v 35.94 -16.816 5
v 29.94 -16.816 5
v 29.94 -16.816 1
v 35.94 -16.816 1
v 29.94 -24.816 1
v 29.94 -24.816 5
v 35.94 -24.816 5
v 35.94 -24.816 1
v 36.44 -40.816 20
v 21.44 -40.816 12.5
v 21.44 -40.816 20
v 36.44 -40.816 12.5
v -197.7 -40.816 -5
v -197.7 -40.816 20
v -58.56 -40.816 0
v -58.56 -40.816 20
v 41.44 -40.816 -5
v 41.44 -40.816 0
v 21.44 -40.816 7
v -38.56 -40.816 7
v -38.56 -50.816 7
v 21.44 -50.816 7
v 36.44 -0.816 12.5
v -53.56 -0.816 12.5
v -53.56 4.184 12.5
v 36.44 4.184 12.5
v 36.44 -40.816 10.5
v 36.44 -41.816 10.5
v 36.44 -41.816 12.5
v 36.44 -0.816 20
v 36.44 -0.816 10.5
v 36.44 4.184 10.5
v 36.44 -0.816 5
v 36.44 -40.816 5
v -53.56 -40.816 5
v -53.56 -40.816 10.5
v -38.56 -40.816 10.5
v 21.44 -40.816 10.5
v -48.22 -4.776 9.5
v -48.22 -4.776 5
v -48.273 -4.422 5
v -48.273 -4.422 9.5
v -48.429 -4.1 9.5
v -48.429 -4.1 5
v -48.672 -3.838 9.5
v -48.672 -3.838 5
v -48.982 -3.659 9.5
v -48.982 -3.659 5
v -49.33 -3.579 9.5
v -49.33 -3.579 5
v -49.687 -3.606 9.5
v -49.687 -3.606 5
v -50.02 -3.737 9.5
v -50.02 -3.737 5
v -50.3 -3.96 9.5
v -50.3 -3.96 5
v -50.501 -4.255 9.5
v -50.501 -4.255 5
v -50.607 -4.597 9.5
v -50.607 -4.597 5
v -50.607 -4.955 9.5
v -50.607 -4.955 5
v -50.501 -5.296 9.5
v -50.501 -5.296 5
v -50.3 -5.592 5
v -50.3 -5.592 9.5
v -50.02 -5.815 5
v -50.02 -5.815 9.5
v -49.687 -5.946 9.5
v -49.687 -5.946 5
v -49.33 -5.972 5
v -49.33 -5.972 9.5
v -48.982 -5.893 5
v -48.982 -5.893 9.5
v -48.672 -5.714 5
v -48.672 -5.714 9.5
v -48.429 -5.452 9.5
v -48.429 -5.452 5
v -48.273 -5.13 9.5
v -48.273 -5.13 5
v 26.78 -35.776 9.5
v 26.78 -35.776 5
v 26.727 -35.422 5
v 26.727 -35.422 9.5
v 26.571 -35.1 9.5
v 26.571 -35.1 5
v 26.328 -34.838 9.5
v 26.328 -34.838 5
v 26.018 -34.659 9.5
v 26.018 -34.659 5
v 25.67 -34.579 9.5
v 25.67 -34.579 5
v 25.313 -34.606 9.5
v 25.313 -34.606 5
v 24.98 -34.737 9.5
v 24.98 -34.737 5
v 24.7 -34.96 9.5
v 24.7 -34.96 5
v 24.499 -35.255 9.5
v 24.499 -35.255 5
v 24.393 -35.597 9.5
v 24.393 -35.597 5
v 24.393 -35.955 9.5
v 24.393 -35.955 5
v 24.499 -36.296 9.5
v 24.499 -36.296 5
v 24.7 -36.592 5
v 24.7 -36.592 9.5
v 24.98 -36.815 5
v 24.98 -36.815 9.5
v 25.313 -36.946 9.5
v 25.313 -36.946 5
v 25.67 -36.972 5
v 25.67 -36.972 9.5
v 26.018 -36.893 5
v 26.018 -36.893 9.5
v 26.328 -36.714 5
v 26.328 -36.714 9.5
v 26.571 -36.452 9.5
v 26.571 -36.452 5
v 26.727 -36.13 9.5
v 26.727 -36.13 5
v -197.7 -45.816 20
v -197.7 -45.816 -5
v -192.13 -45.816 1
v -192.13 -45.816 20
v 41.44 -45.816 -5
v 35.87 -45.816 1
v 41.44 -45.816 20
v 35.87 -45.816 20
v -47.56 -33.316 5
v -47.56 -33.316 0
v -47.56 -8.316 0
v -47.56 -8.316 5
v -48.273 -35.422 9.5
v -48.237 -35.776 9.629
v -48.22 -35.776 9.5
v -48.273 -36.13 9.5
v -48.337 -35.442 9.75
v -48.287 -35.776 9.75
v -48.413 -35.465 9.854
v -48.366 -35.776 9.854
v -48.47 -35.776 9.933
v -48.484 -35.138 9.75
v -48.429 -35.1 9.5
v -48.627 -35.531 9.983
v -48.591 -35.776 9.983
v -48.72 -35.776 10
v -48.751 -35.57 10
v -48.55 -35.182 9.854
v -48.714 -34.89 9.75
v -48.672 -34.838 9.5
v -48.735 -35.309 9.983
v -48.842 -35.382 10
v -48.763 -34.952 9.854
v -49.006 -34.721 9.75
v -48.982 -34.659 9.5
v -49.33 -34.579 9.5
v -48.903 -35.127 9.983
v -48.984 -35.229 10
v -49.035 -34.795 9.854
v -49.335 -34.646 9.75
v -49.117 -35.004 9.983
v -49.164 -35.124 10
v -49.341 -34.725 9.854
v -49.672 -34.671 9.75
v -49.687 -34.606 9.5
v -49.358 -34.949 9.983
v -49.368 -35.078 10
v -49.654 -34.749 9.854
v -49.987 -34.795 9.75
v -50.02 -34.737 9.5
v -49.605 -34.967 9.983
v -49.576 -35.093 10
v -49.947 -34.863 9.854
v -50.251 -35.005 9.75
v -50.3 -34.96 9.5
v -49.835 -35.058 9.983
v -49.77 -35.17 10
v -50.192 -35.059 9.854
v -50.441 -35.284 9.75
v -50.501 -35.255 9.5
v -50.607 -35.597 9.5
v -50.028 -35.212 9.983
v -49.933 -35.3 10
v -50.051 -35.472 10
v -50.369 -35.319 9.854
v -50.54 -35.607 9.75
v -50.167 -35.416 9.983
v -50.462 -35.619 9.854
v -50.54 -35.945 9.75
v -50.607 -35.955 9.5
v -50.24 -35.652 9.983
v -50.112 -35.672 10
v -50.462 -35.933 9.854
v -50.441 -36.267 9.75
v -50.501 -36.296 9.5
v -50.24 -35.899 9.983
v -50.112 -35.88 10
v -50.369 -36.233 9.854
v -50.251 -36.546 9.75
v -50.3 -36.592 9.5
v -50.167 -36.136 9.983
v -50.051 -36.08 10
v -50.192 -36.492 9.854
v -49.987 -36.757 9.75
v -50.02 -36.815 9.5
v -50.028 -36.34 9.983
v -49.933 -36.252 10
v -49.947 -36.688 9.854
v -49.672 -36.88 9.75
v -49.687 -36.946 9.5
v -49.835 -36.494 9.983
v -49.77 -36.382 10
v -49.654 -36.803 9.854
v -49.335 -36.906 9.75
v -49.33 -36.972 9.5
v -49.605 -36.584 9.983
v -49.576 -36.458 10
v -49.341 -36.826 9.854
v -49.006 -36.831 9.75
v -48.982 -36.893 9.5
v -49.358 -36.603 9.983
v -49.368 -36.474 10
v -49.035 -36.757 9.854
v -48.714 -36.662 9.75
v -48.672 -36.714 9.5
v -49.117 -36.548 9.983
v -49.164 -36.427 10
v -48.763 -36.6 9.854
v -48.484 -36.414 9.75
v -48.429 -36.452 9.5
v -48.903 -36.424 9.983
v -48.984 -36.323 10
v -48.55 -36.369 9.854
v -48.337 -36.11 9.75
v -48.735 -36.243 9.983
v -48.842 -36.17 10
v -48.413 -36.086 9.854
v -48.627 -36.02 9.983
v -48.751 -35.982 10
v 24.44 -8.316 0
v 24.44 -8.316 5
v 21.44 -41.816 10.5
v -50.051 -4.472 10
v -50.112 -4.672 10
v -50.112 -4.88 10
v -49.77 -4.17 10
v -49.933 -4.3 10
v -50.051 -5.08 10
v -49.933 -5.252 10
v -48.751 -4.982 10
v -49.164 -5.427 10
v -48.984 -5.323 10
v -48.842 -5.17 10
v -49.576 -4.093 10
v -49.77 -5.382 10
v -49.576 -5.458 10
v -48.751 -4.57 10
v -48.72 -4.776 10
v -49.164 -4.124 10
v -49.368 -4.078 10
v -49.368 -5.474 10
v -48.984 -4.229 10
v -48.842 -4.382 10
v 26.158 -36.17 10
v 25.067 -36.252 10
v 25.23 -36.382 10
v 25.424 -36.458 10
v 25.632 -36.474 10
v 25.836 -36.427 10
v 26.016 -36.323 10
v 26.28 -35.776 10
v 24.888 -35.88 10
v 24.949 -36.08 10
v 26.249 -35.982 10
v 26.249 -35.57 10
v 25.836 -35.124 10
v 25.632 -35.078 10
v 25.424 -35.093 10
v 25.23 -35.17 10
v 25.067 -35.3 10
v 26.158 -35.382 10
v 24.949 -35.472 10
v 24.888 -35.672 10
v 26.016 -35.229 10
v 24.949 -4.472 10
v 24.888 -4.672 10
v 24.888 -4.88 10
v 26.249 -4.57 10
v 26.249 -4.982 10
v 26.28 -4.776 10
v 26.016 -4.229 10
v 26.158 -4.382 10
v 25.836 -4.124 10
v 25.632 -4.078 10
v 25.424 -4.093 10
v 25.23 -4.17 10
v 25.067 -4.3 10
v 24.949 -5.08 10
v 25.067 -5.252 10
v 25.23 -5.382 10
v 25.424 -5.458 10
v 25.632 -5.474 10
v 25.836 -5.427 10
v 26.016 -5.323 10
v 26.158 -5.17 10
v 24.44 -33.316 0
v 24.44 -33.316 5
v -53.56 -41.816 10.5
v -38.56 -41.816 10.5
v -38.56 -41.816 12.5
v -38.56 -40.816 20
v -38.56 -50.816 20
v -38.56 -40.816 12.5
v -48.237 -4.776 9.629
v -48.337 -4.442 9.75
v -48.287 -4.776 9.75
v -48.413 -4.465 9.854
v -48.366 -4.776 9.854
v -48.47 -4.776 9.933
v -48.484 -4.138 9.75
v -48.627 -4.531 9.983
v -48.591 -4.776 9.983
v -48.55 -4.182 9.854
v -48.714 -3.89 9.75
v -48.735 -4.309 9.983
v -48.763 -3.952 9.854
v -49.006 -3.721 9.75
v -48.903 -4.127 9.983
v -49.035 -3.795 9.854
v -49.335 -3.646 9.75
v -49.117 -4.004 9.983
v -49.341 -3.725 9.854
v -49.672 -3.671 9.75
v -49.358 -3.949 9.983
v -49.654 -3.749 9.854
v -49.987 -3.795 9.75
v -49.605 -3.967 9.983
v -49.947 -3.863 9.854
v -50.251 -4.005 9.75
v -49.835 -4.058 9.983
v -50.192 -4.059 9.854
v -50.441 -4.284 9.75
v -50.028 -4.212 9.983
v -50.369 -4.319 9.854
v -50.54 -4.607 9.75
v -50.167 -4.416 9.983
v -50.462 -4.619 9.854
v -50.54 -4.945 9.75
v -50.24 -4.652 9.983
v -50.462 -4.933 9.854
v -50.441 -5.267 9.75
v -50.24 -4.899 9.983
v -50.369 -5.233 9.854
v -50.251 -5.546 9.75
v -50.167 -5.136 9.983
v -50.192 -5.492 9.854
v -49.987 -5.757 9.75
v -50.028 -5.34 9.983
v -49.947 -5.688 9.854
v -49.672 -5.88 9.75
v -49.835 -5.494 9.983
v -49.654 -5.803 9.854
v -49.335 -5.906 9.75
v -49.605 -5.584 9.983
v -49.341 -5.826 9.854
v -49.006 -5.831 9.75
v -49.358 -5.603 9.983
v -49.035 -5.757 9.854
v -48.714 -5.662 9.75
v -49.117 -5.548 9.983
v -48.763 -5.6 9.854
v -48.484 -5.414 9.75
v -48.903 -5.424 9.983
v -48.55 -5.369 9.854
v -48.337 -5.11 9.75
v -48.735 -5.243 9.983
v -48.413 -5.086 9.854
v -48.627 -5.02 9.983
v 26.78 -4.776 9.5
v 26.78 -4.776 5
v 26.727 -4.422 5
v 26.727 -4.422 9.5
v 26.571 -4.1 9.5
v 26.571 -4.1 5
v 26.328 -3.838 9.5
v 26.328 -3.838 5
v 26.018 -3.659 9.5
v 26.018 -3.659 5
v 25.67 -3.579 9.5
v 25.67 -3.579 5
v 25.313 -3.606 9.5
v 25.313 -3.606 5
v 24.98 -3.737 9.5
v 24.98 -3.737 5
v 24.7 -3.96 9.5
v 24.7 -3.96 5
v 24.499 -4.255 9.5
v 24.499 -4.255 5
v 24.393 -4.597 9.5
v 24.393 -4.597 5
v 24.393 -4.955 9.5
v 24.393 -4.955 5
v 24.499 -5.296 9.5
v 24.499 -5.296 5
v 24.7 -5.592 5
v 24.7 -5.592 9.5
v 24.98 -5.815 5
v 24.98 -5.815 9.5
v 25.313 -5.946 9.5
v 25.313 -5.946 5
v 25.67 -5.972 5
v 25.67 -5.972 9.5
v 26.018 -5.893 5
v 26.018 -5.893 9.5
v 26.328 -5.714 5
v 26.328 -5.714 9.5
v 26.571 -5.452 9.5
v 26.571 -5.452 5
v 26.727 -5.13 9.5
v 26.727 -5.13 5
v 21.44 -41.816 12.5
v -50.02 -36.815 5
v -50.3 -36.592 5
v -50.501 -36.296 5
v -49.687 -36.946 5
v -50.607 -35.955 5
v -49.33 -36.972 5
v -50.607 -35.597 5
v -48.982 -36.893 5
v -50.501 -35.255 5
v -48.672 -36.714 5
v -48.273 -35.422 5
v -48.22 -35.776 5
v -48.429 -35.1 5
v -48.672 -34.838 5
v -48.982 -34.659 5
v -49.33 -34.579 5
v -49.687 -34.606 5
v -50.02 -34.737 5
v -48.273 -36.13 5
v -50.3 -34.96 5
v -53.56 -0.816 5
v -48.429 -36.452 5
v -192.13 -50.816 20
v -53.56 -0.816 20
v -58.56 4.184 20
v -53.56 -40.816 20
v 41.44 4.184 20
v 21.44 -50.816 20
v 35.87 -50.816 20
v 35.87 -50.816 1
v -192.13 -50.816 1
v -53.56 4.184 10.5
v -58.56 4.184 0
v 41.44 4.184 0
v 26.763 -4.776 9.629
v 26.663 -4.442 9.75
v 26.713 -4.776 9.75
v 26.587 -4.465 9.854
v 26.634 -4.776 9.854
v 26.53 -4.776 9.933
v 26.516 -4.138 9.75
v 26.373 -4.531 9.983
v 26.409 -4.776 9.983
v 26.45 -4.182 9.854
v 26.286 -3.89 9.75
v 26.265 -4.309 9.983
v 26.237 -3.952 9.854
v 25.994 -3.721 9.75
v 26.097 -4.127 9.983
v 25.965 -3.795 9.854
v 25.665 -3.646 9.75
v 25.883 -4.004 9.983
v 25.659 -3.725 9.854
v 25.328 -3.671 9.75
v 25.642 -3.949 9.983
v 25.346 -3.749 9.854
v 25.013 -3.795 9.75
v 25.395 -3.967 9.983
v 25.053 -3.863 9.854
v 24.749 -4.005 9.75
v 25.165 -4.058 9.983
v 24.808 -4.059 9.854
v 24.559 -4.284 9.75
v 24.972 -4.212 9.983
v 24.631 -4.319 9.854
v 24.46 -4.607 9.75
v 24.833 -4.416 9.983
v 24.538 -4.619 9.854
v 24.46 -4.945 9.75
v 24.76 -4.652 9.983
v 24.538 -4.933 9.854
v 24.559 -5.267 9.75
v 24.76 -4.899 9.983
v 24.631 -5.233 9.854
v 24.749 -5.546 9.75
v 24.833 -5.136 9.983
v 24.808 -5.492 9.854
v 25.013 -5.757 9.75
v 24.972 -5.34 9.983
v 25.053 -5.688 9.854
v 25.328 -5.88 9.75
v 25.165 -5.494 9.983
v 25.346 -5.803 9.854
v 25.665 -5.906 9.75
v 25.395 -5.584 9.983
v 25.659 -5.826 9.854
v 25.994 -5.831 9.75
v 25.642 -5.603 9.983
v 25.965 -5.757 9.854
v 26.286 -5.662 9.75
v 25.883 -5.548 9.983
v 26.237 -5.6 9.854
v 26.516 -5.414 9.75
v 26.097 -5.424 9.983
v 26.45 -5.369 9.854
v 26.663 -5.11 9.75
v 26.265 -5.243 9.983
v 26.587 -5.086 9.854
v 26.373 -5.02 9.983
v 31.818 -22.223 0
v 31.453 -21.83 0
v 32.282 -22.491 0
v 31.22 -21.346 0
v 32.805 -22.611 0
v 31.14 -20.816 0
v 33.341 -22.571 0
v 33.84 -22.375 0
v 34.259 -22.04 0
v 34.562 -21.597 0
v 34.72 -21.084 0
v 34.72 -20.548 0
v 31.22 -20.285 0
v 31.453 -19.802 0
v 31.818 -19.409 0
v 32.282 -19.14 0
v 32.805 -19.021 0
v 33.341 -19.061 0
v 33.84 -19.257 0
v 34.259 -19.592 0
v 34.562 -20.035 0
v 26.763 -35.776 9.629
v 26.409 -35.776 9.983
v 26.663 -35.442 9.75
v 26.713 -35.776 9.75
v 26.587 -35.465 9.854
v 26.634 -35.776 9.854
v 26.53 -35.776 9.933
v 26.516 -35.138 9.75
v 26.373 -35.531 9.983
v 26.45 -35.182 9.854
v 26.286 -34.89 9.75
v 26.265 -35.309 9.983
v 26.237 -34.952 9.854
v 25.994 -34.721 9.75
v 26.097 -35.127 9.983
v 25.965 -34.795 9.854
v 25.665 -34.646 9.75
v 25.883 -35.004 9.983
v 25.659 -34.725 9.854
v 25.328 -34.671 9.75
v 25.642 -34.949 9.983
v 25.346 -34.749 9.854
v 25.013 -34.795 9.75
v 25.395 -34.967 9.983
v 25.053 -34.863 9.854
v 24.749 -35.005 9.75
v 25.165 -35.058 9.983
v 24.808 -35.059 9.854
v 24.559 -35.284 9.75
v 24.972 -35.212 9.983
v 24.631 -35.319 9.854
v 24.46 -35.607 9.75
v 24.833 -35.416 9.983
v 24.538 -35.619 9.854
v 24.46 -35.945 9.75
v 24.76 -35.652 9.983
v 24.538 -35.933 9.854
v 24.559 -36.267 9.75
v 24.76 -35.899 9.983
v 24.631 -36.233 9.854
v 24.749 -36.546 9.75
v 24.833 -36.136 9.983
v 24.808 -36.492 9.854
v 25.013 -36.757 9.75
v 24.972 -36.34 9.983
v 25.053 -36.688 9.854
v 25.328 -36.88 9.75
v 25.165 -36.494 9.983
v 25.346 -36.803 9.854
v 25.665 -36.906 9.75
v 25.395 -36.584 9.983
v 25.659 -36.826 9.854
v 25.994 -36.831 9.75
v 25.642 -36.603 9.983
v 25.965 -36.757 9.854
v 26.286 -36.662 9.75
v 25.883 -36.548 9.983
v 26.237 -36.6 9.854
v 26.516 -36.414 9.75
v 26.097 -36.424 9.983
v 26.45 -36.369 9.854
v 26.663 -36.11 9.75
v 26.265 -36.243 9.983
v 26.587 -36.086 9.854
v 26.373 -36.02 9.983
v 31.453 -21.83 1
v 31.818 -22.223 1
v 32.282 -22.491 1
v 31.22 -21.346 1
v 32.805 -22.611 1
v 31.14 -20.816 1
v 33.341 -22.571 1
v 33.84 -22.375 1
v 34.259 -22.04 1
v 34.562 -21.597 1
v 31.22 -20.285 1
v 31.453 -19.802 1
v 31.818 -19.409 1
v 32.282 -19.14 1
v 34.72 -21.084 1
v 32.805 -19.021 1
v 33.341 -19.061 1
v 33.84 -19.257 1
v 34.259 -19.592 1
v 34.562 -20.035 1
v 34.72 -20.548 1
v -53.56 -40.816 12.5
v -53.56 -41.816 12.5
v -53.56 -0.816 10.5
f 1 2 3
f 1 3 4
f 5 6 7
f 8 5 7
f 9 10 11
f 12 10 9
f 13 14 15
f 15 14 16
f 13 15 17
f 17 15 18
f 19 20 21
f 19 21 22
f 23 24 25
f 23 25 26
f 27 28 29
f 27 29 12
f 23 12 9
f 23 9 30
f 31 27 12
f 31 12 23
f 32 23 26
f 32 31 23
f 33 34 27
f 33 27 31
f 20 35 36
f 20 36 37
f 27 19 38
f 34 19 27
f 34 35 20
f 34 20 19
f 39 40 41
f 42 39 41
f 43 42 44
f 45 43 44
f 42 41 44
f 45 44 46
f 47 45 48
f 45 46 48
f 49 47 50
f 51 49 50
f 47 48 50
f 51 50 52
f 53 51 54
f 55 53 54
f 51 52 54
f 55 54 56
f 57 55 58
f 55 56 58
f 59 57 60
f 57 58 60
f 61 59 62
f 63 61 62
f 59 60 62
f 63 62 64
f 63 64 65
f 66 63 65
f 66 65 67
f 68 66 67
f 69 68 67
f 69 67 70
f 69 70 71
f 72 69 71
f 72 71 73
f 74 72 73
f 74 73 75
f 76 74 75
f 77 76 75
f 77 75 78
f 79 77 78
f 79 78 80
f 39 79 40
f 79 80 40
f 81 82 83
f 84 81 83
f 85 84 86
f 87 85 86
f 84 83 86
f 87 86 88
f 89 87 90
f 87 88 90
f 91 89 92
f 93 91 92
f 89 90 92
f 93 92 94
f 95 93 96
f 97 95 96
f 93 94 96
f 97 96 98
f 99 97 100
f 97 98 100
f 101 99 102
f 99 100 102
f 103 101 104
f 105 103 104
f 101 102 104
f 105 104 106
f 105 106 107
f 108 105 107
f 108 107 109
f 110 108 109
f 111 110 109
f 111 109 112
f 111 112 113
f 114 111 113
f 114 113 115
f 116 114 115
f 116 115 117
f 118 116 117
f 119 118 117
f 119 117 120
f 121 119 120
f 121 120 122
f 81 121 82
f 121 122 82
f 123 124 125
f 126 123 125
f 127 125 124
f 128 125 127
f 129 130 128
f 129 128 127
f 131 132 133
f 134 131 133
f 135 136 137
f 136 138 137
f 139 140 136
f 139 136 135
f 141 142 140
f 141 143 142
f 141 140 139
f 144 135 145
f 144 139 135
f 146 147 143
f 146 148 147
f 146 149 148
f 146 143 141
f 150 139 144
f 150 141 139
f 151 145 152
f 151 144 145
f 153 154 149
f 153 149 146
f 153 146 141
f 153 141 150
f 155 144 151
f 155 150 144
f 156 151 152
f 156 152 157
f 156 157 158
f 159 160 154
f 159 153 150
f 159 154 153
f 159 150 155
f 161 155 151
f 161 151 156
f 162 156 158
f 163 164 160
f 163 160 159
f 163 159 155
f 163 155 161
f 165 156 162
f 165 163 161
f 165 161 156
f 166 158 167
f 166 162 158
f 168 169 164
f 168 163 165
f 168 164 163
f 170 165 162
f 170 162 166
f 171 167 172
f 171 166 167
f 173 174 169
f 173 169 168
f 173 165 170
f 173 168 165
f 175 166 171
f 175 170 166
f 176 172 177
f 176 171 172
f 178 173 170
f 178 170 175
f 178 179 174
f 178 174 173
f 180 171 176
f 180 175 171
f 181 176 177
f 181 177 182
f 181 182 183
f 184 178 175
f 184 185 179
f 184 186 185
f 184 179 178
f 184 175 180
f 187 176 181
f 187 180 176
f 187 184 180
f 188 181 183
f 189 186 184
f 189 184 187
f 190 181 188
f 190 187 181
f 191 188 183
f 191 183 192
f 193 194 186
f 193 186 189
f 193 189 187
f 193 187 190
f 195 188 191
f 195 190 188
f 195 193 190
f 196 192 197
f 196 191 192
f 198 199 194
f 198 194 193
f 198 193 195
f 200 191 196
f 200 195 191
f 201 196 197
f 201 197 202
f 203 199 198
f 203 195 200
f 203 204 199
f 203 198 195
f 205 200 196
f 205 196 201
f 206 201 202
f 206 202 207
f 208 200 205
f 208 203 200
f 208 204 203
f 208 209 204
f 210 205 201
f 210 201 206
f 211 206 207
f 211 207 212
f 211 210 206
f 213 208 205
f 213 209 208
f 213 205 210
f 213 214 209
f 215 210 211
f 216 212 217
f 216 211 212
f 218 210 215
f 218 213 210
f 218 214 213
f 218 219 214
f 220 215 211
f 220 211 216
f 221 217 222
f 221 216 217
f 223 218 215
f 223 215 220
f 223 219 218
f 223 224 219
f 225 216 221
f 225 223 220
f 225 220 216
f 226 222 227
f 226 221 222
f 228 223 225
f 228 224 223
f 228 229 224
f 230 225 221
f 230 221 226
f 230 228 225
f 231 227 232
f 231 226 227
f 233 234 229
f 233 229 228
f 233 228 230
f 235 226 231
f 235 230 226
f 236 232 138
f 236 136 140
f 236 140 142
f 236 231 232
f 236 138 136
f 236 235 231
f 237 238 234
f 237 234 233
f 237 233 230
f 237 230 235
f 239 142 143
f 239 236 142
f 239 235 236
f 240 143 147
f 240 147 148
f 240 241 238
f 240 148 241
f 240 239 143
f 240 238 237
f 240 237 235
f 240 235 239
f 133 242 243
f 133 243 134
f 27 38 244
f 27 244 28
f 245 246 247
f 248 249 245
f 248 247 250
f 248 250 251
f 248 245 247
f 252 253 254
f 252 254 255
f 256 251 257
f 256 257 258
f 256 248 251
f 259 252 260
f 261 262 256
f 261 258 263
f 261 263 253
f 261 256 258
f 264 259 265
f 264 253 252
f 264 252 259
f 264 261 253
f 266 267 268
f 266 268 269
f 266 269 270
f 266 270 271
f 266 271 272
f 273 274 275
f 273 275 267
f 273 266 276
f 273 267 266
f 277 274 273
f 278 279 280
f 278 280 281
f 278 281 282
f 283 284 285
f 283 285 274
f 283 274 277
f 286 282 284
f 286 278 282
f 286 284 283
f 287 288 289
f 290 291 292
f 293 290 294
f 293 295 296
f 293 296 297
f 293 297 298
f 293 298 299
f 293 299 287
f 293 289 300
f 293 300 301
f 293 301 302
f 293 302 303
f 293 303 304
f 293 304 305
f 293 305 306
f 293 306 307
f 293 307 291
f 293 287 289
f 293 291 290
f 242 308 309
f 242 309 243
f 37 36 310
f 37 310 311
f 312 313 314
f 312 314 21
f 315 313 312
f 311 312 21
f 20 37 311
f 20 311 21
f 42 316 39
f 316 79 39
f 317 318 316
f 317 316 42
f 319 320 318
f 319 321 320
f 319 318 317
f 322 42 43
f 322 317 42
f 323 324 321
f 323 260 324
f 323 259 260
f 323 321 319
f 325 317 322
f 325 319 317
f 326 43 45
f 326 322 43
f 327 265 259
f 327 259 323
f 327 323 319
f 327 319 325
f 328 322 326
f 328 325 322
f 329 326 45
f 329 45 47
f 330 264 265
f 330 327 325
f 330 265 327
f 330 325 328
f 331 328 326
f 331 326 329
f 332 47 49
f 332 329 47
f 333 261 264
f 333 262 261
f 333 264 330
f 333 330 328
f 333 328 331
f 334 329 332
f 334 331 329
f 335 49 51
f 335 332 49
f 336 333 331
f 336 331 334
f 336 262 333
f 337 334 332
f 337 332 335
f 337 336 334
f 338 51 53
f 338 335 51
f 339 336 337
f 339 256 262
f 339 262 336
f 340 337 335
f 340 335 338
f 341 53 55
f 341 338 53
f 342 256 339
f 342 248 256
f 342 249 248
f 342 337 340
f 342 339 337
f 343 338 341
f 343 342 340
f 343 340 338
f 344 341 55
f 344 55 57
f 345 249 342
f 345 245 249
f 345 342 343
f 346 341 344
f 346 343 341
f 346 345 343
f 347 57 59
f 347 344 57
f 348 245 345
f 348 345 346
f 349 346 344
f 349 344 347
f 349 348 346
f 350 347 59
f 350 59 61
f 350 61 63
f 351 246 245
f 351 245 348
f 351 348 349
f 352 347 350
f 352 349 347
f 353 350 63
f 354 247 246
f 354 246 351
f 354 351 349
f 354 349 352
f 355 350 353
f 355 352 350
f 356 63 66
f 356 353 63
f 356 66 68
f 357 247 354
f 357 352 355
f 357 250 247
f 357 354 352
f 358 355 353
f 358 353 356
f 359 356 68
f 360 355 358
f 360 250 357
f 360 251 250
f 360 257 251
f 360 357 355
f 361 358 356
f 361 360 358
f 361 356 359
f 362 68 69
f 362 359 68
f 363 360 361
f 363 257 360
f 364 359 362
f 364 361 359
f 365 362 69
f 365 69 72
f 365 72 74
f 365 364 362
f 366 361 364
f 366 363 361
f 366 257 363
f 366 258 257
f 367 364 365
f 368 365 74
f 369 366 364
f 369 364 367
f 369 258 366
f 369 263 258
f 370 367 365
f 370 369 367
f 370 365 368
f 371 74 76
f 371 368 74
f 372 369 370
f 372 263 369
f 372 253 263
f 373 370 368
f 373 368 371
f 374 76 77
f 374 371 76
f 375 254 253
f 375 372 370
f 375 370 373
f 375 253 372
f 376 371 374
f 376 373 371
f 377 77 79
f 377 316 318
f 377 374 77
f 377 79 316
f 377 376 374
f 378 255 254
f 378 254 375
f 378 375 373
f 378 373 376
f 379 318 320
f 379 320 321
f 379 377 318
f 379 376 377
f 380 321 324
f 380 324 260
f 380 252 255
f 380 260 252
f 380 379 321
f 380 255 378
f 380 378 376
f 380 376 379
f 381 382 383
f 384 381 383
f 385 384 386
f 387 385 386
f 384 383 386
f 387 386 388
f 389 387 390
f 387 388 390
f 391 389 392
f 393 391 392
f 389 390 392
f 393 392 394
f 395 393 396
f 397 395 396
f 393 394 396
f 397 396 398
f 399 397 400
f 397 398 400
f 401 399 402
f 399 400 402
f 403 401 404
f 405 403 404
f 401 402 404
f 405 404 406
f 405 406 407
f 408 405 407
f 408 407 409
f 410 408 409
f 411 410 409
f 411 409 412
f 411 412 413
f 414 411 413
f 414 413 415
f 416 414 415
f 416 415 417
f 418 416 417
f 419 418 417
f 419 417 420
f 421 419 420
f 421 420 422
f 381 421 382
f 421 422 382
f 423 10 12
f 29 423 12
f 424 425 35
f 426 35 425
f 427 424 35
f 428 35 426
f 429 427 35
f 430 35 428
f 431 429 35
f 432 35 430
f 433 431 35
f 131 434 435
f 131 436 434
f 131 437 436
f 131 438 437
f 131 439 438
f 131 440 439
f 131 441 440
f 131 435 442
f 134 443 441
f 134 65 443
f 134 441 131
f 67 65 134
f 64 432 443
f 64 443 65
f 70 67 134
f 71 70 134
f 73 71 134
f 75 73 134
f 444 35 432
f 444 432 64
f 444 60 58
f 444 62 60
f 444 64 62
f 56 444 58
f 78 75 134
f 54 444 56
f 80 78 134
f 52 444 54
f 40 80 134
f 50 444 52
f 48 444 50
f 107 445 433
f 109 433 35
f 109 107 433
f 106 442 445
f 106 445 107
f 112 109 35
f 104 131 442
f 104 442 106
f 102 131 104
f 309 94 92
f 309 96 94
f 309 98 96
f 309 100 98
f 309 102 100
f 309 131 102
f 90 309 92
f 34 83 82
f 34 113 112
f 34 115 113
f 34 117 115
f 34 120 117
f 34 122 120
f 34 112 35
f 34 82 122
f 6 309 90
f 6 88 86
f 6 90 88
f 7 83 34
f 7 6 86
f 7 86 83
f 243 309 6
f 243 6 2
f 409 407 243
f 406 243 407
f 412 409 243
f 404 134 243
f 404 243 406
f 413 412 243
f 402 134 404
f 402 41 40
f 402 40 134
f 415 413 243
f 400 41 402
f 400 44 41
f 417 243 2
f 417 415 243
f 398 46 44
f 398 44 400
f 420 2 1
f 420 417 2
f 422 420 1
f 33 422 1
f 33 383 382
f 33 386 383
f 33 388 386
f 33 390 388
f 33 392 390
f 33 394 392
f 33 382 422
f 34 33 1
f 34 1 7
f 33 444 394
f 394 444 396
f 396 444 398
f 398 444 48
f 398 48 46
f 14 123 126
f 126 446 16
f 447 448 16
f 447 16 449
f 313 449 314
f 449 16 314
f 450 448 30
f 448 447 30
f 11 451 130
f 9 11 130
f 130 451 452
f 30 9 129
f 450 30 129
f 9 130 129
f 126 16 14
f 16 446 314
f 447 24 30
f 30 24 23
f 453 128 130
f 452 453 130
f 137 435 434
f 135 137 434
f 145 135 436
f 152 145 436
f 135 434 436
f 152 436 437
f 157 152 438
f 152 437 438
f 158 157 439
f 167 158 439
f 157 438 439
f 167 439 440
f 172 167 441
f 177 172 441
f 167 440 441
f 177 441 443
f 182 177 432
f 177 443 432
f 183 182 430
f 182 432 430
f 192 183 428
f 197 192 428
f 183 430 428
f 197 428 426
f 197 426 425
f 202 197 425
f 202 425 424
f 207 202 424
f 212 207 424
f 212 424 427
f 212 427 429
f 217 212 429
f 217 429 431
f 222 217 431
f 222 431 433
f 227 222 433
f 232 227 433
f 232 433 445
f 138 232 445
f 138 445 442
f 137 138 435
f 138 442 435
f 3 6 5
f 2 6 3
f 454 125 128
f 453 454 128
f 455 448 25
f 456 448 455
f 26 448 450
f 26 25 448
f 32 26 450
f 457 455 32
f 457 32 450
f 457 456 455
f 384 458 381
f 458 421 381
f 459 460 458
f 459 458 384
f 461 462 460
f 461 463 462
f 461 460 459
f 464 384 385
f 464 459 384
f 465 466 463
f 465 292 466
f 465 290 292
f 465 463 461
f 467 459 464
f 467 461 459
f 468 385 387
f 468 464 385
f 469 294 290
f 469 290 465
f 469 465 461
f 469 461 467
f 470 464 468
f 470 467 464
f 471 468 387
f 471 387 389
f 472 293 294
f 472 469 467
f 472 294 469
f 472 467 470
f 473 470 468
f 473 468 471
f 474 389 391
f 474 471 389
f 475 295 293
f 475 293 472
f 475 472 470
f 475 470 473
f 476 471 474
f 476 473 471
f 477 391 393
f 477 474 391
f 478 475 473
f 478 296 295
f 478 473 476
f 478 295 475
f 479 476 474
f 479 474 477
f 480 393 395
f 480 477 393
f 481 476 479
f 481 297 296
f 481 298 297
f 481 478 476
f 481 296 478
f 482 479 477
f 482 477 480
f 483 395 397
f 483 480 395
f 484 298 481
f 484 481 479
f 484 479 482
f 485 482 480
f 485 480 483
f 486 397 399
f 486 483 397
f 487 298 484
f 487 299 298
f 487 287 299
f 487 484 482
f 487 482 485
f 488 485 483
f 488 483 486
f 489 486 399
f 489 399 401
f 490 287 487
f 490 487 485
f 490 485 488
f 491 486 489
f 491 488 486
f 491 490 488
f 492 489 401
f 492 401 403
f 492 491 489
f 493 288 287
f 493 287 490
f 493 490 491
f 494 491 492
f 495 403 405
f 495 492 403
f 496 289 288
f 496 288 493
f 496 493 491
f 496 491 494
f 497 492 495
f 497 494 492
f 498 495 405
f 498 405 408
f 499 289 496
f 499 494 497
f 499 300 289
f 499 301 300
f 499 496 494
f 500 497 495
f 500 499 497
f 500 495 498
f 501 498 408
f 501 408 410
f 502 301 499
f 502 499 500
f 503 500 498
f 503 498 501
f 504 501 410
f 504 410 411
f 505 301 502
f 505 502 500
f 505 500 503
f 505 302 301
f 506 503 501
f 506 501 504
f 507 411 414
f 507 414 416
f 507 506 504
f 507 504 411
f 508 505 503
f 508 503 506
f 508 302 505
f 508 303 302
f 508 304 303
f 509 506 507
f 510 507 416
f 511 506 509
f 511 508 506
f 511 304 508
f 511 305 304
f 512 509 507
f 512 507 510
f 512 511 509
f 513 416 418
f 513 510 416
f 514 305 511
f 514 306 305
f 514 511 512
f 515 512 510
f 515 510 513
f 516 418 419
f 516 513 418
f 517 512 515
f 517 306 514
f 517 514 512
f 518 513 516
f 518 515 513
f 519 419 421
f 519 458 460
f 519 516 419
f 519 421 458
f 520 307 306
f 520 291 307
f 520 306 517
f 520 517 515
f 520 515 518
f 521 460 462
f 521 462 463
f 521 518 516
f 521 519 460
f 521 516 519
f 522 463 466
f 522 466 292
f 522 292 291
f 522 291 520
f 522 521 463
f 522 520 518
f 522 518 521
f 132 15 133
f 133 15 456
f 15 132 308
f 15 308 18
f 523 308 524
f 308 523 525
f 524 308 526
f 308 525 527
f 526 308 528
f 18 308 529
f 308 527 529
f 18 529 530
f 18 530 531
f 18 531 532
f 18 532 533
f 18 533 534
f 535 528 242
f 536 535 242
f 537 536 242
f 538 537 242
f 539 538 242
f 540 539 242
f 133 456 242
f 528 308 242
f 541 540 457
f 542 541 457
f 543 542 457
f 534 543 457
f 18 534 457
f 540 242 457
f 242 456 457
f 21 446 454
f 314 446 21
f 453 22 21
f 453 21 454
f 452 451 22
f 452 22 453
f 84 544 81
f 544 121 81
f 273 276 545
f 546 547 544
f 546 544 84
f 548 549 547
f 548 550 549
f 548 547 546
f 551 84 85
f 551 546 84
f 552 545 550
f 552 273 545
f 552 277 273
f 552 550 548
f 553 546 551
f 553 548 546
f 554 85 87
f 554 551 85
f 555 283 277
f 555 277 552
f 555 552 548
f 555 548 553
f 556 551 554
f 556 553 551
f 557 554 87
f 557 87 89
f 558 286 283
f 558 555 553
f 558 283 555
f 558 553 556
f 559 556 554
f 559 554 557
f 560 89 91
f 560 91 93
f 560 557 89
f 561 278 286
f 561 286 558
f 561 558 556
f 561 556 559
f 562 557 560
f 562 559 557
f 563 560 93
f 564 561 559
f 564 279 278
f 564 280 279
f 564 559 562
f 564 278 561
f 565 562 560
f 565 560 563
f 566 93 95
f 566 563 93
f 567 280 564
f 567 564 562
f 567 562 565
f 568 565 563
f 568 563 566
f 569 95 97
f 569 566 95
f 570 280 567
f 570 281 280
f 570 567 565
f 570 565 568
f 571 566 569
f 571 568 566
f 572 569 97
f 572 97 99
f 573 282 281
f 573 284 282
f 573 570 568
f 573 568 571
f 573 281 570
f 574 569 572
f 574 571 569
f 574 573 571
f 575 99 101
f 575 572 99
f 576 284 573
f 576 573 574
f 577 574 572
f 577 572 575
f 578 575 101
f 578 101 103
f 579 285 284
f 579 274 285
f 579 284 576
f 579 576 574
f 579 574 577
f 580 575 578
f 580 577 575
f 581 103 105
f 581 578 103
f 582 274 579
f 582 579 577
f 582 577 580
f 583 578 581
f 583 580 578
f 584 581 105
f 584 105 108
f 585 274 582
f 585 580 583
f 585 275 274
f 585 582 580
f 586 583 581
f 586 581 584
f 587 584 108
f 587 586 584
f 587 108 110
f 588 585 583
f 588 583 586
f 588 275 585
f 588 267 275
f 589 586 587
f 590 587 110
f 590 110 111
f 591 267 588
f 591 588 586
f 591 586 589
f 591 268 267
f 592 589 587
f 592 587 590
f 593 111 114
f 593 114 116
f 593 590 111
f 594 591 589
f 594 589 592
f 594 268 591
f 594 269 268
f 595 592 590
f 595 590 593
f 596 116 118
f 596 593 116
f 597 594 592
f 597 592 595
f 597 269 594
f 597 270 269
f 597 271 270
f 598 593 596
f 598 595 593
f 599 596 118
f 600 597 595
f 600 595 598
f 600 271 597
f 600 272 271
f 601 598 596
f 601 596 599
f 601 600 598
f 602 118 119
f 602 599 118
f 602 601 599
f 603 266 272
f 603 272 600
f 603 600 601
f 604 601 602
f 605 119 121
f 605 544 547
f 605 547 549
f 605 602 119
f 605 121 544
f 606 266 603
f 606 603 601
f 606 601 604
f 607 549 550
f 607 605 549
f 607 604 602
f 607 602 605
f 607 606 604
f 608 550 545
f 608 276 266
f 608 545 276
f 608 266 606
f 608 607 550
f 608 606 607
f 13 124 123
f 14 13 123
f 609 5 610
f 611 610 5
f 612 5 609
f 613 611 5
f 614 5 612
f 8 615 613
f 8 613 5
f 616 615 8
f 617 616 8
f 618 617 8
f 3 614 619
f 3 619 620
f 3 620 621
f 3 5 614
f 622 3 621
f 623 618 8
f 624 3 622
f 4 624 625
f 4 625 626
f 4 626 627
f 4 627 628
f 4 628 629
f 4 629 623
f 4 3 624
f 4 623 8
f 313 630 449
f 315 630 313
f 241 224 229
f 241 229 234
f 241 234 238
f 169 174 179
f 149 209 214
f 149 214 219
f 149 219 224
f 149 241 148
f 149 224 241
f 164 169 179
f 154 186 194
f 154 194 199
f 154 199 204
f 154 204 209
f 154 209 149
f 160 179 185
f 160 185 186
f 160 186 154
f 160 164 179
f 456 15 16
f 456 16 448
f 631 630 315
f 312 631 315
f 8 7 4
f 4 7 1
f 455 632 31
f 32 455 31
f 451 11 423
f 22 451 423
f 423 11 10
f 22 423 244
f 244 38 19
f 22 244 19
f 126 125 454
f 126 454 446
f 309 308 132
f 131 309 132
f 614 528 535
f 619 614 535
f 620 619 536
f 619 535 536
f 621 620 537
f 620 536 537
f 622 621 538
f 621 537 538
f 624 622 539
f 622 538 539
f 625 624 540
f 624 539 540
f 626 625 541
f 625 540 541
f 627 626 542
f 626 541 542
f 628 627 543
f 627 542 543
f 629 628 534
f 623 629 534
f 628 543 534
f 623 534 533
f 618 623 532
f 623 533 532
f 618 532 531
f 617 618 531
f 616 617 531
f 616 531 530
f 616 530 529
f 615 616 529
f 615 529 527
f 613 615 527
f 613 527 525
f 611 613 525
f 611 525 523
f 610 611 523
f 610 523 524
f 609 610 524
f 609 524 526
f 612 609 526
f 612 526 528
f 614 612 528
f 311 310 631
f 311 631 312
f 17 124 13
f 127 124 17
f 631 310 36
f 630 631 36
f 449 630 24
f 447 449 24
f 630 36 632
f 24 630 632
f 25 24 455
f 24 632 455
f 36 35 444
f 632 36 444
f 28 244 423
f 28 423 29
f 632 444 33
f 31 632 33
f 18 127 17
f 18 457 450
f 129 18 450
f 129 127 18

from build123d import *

# Parameters (mm, degrees)
SKETCH2_W           = 100
SKETCH2_H           = 50
BOSS_EXTRUDE1_DEPTH = 20
SHELL1_T            = -5
SKETCH5_W           = 72
SKETCH5_H           = 25
CUT_EXTRUDE1_DEPTH  = 77.995878023
SKETCH6_R           = 1.8
CUT_EXTRUDE2_DEPTH  = 77.995878023
SKETCH7_W           = 6
SKETCH7_H           = 8
CUT_EXTRUDE3_DEPTH  = 4
SKETCH8_W           = 239.14
SKETCH8_H           = 25
BOSS_EXTRUDE2_DEPTH = 5
SKETCH9_W           = 228
SKETCH9_H           = 19
BOSS_EXTRUDE3_DEPTH = 5
SKETCH10_W          = 60
SKETCH10_H          = 13
CUT_EXTRUDE4_DEPTH  = 19
SKETCH11_R          = 1.2
BOSS_EXTRUDE4_DEPTH = 5
SKETCH12_R          = 1.2
BOSS_EXTRUDE5_DEPTH = 5
SKETCH13_R          = 1.2
BOSS_EXTRUDE6_DEPTH = 5
SKETCH14_R          = 1.2
BOSS_EXTRUDE7_DEPTH = 5
FILLET3_R           = 0.5
FILLET4_R           = 0.5
FILLET5_R           = 0.5
FILLET6_R           = 0.5
SKETCH16_W          = 15
SKETCH16_H          = 2
CUT_EXTRUDE5_DEPTH  = 1
SKETCH17_W          = 90
SKETCH17_H          = 2
CUT_EXTRUDE6_DEPTH  = 205.903131616


with BuildPart() as part:
    # Sketch2 → Boss-Extrude1 (new body)
    with BuildSketch(Plane.XY):
        with Locations((-8.560008462, -20.815833959)):
            Rectangle(SKETCH2_W, SKETCH2_H)
    extrude(amount=BOSS_EXTRUDE1_DEPTH)

    # Shell1
    shell1_openings = [part.faces().sort_by_distance(p)[0] for p in [
        (-8.560008462, -20.815833959, 20),
    ]]
    offset(amount=SHELL1_T, openings=shell1_openings, kind=Kind.INTERSECTION)

    # Sketch5 → Cut-Extrude1 (cut, through all)
    with BuildSketch(Plane(origin=(0, 0, 0), x_dir=(-1, 0, 0), z_dir=(0, 0, -1))):
        with Locations((11.560008462, -20.815833959)):
            Rectangle(SKETCH5_W, SKETCH5_H)
    extrude(amount=-CUT_EXTRUDE1_DEPTH, mode=Mode.SUBTRACT)

    # Sketch6 → Cut-Extrude2 (cut, through all)
    with BuildSketch(Plane(origin=(0, 0, 0), x_dir=(-1, 0, 0), z_dir=(0, 0, -1))):
        with Locations((-32.939991538, -20.815833959)):
            Circle(SKETCH6_R)
    extrude(amount=-CUT_EXTRUDE2_DEPTH, mode=Mode.SUBTRACT)

    # Sketch7 → Cut-Extrude3 (cut)
    with BuildSketch(Plane.XY.offset(5)):
        with Locations((32.939991538, -20.815833959)):
            Rectangle(SKETCH7_W, SKETCH7_H)
    extrude(amount=-CUT_EXTRUDE3_DEPTH, mode=Mode.SUBTRACT)

    # Sketch8 → Boss-Extrude2 (add)
    with BuildSketch(Plane.XZ.offset(45.815833959)):
        with Locations((-78.130008462, 7.5)):
            Rectangle(SKETCH8_W, SKETCH8_H)
    extrude(amount=-BOSS_EXTRUDE2_DEPTH)

    # Sketch9 → Boss-Extrude3 (add)
    with BuildSketch(Plane.XZ.offset(45.815833959)):
        with Locations((-78.130008462, 10.5)):
            Rectangle(SKETCH9_W, SKETCH9_H)
    extrude(amount=BOSS_EXTRUDE3_DEPTH)

    # Sketch10 → Cut-Extrude4 (cut)
    with BuildSketch(Plane(origin=(0, -40.815833959, 0), x_dir=(1, 0, 0), z_dir=(0, 1, 0))):
        with Locations((-8.560008462, -13.5)):
            Rectangle(SKETCH10_W, SKETCH10_H)
    extrude(amount=-CUT_EXTRUDE4_DEPTH, mode=Mode.SUBTRACT)

    # Sketch11 → Boss-Extrude4 (add)
    with BuildSketch(Plane.XY.offset(5)):
        with Locations((-49.420008462, -4.775833959)):
            Circle(SKETCH11_R)
    extrude(amount=BOSS_EXTRUDE4_DEPTH)

    # Sketch12 → Boss-Extrude5 (add)
    with BuildSketch(Plane.XY.offset(5)):
        with Locations((25.579991538, -4.775833959)):
            Circle(SKETCH12_R)
    extrude(amount=BOSS_EXTRUDE5_DEPTH)

    # Sketch13 → Boss-Extrude6 (add)
    with BuildSketch(Plane.XY.offset(5)):
        with Locations((-49.420008462, -35.775833959)):
            Circle(SKETCH13_R)
    extrude(amount=BOSS_EXTRUDE6_DEPTH)

    # Sketch14 → Boss-Extrude7 (add)
    with BuildSketch(Plane.XY.offset(5)):
        with Locations((25.579991538, -35.775833959)):
            Circle(SKETCH14_R)
    extrude(amount=BOSS_EXTRUDE7_DEPTH)

    # Fillet3
    fillet3_edges = [part.edges().sort_by_distance(p)[0] for p in [
        (-50.620008462, -35.775833959, 10),
    ]]
    fillet(fillet3_edges, radius=FILLET3_R)

    # Fillet4
    fillet4_edges = [part.edges().sort_by_distance(p)[0] for p in [
        (-50.620008462, -4.775833959, 10),
    ]]
    fillet(fillet4_edges, radius=FILLET4_R)

    # Fillet5
    fillet5_edges = [part.edges().sort_by_distance(p)[0] for p in [
        (24.379991538, -4.775833959, 10),
    ]]
    fillet(fillet5_edges, radius=FILLET5_R)

    # Fillet6
    fillet6_edges = [part.edges().sort_by_distance(p)[0] for p in [
        (24.379991538, -35.775833959, 10),
    ]]
    fillet(fillet6_edges, radius=FILLET6_R)

    # Sketch16 → Cut-Extrude5 (cut)
    with BuildSketch(Plane(origin=(0, -40.815833959, 0), x_dir=(1, 0, 0), z_dir=(0, 1, 0))):
        with Locations((-46.060008462, -11.5)):
            Rectangle(SKETCH16_W, SKETCH16_H)
        with Locations((28.939991538, -11.5)):
            Rectangle(SKETCH16_W, SKETCH16_H)
    extrude(amount=-CUT_EXTRUDE5_DEPTH, mode=Mode.SUBTRACT)

    # Sketch17 → Cut-Extrude6 (cut, through all)
    with BuildSketch(Plane.XZ.offset(0.815833959)):
        with Locations((-8.560008462, 11.5)):
            Rectangle(SKETCH17_W, SKETCH17_H)
    extrude(amount=-CUT_EXTRUDE6_DEPTH, mode=Mode.SUBTRACT)


solid = part.part
